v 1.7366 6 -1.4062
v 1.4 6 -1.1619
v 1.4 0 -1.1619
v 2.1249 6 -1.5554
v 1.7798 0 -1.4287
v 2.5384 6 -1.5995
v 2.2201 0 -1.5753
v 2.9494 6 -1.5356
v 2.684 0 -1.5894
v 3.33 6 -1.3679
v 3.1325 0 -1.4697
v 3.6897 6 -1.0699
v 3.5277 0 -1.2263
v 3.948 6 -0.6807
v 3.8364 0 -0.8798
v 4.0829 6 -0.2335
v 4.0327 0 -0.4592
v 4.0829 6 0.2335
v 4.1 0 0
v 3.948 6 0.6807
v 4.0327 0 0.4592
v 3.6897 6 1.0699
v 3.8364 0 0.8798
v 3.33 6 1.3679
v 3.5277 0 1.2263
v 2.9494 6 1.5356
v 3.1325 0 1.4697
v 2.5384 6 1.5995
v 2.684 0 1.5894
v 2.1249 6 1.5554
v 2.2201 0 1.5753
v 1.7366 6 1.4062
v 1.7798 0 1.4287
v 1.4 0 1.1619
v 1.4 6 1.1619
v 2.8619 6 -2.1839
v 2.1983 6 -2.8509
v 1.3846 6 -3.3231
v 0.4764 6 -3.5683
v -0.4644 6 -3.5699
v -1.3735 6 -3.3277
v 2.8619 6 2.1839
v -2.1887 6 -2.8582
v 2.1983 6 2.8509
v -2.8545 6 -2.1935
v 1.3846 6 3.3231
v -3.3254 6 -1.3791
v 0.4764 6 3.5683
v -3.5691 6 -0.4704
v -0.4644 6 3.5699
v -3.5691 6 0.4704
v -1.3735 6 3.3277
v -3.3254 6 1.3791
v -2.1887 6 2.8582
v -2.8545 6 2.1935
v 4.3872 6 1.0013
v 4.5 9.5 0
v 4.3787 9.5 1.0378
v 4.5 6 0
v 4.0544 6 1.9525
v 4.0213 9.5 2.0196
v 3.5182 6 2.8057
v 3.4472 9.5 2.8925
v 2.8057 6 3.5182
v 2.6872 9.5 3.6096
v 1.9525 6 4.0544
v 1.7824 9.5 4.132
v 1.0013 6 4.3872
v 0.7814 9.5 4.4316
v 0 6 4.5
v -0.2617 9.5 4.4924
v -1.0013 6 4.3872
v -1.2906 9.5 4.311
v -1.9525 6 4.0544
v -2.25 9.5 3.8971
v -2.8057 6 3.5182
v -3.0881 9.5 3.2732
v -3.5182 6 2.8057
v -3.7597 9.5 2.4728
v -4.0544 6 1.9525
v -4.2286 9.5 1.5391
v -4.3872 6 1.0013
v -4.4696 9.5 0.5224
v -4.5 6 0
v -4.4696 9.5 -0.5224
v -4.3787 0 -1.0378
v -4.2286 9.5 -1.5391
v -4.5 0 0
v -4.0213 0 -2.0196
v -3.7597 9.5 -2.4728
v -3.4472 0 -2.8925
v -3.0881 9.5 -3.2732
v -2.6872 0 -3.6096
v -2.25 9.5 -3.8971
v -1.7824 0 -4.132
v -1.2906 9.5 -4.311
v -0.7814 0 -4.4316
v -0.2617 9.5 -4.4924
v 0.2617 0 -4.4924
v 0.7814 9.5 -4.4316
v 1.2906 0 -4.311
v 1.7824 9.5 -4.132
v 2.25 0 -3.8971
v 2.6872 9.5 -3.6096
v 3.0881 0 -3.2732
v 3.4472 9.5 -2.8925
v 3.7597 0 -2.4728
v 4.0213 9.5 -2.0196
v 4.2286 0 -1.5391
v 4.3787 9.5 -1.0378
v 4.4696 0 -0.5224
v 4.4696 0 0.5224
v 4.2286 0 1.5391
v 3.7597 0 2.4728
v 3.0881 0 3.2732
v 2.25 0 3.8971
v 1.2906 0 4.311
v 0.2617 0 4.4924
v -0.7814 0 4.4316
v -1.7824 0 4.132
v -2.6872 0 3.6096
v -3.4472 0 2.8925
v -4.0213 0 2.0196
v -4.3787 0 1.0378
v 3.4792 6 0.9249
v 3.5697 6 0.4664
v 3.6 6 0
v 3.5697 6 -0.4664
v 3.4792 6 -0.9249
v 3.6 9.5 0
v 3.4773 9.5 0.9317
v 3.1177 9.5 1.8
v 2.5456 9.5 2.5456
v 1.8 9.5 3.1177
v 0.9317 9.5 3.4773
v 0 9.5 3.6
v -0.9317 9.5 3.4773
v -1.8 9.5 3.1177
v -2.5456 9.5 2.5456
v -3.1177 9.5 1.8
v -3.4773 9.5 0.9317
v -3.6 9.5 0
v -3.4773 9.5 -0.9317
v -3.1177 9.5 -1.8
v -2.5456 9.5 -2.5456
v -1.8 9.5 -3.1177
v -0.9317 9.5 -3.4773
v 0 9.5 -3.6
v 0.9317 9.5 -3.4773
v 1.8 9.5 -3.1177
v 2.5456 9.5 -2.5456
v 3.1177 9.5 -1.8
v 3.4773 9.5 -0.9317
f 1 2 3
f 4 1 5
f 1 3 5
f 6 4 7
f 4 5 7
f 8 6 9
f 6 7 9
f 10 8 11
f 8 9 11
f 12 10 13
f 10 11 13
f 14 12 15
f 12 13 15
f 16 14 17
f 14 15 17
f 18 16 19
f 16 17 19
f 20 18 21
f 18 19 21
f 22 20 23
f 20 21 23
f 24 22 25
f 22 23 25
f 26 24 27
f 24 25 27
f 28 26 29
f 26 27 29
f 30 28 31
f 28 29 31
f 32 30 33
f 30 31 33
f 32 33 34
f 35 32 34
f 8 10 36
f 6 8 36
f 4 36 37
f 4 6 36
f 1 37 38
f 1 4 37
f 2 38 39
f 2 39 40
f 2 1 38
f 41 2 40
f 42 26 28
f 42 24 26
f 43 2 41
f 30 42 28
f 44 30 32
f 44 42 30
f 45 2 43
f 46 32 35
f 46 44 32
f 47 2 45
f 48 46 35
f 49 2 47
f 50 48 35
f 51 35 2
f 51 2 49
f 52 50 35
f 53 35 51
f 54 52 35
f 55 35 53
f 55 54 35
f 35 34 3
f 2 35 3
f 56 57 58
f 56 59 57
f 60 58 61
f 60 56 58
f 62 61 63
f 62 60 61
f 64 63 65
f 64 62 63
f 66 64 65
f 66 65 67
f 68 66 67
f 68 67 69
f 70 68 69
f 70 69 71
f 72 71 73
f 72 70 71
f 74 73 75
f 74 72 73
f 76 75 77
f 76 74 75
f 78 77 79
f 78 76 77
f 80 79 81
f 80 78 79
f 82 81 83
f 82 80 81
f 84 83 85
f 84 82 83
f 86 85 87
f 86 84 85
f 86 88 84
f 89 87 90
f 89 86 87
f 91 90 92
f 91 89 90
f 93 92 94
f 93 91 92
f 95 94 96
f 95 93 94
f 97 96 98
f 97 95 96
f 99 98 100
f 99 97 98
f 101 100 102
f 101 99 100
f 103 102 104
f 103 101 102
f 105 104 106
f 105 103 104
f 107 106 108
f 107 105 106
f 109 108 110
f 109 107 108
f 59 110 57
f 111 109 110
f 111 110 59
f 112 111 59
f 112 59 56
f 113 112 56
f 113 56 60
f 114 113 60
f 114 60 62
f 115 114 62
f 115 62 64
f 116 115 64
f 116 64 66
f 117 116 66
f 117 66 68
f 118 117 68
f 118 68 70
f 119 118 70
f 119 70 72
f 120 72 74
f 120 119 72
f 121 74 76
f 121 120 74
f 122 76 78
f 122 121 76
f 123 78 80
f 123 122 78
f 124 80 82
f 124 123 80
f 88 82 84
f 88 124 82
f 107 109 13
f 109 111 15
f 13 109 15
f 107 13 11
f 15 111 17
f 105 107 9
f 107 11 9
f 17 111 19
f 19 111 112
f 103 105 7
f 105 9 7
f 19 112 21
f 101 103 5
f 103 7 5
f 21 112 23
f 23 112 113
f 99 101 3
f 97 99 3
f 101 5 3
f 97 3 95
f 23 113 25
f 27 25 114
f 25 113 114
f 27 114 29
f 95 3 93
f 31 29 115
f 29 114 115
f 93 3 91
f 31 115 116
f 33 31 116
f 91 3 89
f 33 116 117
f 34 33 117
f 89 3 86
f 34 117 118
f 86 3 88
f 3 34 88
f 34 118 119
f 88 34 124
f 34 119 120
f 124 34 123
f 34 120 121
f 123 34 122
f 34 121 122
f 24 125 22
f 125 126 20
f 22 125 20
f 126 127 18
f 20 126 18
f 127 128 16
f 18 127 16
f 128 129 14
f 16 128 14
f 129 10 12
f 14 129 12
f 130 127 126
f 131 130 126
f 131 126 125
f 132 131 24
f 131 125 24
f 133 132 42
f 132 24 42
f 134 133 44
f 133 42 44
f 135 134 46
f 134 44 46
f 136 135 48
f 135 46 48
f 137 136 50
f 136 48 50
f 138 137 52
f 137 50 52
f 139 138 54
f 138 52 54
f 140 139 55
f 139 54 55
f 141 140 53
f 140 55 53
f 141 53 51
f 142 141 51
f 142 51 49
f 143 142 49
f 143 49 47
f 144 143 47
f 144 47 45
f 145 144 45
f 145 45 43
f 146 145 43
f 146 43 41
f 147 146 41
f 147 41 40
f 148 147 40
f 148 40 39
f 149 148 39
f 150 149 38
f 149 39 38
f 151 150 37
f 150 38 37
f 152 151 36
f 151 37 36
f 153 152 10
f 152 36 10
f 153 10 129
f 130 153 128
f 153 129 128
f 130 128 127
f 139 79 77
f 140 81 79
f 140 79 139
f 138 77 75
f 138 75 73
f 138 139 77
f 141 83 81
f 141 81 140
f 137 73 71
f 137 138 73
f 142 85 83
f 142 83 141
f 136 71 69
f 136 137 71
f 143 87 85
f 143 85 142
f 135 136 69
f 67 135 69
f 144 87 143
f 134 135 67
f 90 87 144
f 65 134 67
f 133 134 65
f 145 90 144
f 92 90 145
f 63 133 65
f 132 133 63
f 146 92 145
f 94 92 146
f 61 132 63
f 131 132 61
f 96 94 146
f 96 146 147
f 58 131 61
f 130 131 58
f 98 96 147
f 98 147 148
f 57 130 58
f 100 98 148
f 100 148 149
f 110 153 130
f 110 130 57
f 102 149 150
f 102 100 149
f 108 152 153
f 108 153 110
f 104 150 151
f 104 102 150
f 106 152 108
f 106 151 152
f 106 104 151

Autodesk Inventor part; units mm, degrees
ref_plane "YZ Plane" through (0, 0, 0) normal (1, 0, 0) x (0, 1, 0)
ref_plane "XZ Plane" through (0, 0, 0) normal (0, 1, 0) x (-1, 0, 0)
ref_plane "XY Plane" through (0, 0, 0) normal (0, 0, 1) x (1, 0, 0)
sketch "草图1" plane through (0, 0, 0) normal (0, 1, 0) x (-1, 0, 0)
  point P0 (0, 0)
sketch "草图2" plane through (0, 0, 0) normal (0, 1, 0) x (-1, 0, 0)
  circle A0 centre (0, 0) radius 4.5
  arc A1 (-1.4, 1.1619) -> (-1.4, -1.1619) centre (-2.5, 0) ccw
  line L0 (-1.4, 1.1619) -> (-1.4, -1.1619)
  dimension "d0" = 9
  dimension "d1" = 3.2
  dimension "d2" = 2.7
  dimension "d3" = 2.5
extrude "拉伸1" add sketch "草图2" along normal blind 6
sketch "草图3" plane through (0, 6, 0) normal (0, 1, 0) x (1, 0, 0)
  circle A0 centre (0, 0) radius 4.5 projected
  circle A1 centre (0, 0) radius 3.6
  dimension "d6" = 7.2
extrude "拉伸2" add sketch "草图3" along normal blind 3.5
properties part number "偏心轮"
